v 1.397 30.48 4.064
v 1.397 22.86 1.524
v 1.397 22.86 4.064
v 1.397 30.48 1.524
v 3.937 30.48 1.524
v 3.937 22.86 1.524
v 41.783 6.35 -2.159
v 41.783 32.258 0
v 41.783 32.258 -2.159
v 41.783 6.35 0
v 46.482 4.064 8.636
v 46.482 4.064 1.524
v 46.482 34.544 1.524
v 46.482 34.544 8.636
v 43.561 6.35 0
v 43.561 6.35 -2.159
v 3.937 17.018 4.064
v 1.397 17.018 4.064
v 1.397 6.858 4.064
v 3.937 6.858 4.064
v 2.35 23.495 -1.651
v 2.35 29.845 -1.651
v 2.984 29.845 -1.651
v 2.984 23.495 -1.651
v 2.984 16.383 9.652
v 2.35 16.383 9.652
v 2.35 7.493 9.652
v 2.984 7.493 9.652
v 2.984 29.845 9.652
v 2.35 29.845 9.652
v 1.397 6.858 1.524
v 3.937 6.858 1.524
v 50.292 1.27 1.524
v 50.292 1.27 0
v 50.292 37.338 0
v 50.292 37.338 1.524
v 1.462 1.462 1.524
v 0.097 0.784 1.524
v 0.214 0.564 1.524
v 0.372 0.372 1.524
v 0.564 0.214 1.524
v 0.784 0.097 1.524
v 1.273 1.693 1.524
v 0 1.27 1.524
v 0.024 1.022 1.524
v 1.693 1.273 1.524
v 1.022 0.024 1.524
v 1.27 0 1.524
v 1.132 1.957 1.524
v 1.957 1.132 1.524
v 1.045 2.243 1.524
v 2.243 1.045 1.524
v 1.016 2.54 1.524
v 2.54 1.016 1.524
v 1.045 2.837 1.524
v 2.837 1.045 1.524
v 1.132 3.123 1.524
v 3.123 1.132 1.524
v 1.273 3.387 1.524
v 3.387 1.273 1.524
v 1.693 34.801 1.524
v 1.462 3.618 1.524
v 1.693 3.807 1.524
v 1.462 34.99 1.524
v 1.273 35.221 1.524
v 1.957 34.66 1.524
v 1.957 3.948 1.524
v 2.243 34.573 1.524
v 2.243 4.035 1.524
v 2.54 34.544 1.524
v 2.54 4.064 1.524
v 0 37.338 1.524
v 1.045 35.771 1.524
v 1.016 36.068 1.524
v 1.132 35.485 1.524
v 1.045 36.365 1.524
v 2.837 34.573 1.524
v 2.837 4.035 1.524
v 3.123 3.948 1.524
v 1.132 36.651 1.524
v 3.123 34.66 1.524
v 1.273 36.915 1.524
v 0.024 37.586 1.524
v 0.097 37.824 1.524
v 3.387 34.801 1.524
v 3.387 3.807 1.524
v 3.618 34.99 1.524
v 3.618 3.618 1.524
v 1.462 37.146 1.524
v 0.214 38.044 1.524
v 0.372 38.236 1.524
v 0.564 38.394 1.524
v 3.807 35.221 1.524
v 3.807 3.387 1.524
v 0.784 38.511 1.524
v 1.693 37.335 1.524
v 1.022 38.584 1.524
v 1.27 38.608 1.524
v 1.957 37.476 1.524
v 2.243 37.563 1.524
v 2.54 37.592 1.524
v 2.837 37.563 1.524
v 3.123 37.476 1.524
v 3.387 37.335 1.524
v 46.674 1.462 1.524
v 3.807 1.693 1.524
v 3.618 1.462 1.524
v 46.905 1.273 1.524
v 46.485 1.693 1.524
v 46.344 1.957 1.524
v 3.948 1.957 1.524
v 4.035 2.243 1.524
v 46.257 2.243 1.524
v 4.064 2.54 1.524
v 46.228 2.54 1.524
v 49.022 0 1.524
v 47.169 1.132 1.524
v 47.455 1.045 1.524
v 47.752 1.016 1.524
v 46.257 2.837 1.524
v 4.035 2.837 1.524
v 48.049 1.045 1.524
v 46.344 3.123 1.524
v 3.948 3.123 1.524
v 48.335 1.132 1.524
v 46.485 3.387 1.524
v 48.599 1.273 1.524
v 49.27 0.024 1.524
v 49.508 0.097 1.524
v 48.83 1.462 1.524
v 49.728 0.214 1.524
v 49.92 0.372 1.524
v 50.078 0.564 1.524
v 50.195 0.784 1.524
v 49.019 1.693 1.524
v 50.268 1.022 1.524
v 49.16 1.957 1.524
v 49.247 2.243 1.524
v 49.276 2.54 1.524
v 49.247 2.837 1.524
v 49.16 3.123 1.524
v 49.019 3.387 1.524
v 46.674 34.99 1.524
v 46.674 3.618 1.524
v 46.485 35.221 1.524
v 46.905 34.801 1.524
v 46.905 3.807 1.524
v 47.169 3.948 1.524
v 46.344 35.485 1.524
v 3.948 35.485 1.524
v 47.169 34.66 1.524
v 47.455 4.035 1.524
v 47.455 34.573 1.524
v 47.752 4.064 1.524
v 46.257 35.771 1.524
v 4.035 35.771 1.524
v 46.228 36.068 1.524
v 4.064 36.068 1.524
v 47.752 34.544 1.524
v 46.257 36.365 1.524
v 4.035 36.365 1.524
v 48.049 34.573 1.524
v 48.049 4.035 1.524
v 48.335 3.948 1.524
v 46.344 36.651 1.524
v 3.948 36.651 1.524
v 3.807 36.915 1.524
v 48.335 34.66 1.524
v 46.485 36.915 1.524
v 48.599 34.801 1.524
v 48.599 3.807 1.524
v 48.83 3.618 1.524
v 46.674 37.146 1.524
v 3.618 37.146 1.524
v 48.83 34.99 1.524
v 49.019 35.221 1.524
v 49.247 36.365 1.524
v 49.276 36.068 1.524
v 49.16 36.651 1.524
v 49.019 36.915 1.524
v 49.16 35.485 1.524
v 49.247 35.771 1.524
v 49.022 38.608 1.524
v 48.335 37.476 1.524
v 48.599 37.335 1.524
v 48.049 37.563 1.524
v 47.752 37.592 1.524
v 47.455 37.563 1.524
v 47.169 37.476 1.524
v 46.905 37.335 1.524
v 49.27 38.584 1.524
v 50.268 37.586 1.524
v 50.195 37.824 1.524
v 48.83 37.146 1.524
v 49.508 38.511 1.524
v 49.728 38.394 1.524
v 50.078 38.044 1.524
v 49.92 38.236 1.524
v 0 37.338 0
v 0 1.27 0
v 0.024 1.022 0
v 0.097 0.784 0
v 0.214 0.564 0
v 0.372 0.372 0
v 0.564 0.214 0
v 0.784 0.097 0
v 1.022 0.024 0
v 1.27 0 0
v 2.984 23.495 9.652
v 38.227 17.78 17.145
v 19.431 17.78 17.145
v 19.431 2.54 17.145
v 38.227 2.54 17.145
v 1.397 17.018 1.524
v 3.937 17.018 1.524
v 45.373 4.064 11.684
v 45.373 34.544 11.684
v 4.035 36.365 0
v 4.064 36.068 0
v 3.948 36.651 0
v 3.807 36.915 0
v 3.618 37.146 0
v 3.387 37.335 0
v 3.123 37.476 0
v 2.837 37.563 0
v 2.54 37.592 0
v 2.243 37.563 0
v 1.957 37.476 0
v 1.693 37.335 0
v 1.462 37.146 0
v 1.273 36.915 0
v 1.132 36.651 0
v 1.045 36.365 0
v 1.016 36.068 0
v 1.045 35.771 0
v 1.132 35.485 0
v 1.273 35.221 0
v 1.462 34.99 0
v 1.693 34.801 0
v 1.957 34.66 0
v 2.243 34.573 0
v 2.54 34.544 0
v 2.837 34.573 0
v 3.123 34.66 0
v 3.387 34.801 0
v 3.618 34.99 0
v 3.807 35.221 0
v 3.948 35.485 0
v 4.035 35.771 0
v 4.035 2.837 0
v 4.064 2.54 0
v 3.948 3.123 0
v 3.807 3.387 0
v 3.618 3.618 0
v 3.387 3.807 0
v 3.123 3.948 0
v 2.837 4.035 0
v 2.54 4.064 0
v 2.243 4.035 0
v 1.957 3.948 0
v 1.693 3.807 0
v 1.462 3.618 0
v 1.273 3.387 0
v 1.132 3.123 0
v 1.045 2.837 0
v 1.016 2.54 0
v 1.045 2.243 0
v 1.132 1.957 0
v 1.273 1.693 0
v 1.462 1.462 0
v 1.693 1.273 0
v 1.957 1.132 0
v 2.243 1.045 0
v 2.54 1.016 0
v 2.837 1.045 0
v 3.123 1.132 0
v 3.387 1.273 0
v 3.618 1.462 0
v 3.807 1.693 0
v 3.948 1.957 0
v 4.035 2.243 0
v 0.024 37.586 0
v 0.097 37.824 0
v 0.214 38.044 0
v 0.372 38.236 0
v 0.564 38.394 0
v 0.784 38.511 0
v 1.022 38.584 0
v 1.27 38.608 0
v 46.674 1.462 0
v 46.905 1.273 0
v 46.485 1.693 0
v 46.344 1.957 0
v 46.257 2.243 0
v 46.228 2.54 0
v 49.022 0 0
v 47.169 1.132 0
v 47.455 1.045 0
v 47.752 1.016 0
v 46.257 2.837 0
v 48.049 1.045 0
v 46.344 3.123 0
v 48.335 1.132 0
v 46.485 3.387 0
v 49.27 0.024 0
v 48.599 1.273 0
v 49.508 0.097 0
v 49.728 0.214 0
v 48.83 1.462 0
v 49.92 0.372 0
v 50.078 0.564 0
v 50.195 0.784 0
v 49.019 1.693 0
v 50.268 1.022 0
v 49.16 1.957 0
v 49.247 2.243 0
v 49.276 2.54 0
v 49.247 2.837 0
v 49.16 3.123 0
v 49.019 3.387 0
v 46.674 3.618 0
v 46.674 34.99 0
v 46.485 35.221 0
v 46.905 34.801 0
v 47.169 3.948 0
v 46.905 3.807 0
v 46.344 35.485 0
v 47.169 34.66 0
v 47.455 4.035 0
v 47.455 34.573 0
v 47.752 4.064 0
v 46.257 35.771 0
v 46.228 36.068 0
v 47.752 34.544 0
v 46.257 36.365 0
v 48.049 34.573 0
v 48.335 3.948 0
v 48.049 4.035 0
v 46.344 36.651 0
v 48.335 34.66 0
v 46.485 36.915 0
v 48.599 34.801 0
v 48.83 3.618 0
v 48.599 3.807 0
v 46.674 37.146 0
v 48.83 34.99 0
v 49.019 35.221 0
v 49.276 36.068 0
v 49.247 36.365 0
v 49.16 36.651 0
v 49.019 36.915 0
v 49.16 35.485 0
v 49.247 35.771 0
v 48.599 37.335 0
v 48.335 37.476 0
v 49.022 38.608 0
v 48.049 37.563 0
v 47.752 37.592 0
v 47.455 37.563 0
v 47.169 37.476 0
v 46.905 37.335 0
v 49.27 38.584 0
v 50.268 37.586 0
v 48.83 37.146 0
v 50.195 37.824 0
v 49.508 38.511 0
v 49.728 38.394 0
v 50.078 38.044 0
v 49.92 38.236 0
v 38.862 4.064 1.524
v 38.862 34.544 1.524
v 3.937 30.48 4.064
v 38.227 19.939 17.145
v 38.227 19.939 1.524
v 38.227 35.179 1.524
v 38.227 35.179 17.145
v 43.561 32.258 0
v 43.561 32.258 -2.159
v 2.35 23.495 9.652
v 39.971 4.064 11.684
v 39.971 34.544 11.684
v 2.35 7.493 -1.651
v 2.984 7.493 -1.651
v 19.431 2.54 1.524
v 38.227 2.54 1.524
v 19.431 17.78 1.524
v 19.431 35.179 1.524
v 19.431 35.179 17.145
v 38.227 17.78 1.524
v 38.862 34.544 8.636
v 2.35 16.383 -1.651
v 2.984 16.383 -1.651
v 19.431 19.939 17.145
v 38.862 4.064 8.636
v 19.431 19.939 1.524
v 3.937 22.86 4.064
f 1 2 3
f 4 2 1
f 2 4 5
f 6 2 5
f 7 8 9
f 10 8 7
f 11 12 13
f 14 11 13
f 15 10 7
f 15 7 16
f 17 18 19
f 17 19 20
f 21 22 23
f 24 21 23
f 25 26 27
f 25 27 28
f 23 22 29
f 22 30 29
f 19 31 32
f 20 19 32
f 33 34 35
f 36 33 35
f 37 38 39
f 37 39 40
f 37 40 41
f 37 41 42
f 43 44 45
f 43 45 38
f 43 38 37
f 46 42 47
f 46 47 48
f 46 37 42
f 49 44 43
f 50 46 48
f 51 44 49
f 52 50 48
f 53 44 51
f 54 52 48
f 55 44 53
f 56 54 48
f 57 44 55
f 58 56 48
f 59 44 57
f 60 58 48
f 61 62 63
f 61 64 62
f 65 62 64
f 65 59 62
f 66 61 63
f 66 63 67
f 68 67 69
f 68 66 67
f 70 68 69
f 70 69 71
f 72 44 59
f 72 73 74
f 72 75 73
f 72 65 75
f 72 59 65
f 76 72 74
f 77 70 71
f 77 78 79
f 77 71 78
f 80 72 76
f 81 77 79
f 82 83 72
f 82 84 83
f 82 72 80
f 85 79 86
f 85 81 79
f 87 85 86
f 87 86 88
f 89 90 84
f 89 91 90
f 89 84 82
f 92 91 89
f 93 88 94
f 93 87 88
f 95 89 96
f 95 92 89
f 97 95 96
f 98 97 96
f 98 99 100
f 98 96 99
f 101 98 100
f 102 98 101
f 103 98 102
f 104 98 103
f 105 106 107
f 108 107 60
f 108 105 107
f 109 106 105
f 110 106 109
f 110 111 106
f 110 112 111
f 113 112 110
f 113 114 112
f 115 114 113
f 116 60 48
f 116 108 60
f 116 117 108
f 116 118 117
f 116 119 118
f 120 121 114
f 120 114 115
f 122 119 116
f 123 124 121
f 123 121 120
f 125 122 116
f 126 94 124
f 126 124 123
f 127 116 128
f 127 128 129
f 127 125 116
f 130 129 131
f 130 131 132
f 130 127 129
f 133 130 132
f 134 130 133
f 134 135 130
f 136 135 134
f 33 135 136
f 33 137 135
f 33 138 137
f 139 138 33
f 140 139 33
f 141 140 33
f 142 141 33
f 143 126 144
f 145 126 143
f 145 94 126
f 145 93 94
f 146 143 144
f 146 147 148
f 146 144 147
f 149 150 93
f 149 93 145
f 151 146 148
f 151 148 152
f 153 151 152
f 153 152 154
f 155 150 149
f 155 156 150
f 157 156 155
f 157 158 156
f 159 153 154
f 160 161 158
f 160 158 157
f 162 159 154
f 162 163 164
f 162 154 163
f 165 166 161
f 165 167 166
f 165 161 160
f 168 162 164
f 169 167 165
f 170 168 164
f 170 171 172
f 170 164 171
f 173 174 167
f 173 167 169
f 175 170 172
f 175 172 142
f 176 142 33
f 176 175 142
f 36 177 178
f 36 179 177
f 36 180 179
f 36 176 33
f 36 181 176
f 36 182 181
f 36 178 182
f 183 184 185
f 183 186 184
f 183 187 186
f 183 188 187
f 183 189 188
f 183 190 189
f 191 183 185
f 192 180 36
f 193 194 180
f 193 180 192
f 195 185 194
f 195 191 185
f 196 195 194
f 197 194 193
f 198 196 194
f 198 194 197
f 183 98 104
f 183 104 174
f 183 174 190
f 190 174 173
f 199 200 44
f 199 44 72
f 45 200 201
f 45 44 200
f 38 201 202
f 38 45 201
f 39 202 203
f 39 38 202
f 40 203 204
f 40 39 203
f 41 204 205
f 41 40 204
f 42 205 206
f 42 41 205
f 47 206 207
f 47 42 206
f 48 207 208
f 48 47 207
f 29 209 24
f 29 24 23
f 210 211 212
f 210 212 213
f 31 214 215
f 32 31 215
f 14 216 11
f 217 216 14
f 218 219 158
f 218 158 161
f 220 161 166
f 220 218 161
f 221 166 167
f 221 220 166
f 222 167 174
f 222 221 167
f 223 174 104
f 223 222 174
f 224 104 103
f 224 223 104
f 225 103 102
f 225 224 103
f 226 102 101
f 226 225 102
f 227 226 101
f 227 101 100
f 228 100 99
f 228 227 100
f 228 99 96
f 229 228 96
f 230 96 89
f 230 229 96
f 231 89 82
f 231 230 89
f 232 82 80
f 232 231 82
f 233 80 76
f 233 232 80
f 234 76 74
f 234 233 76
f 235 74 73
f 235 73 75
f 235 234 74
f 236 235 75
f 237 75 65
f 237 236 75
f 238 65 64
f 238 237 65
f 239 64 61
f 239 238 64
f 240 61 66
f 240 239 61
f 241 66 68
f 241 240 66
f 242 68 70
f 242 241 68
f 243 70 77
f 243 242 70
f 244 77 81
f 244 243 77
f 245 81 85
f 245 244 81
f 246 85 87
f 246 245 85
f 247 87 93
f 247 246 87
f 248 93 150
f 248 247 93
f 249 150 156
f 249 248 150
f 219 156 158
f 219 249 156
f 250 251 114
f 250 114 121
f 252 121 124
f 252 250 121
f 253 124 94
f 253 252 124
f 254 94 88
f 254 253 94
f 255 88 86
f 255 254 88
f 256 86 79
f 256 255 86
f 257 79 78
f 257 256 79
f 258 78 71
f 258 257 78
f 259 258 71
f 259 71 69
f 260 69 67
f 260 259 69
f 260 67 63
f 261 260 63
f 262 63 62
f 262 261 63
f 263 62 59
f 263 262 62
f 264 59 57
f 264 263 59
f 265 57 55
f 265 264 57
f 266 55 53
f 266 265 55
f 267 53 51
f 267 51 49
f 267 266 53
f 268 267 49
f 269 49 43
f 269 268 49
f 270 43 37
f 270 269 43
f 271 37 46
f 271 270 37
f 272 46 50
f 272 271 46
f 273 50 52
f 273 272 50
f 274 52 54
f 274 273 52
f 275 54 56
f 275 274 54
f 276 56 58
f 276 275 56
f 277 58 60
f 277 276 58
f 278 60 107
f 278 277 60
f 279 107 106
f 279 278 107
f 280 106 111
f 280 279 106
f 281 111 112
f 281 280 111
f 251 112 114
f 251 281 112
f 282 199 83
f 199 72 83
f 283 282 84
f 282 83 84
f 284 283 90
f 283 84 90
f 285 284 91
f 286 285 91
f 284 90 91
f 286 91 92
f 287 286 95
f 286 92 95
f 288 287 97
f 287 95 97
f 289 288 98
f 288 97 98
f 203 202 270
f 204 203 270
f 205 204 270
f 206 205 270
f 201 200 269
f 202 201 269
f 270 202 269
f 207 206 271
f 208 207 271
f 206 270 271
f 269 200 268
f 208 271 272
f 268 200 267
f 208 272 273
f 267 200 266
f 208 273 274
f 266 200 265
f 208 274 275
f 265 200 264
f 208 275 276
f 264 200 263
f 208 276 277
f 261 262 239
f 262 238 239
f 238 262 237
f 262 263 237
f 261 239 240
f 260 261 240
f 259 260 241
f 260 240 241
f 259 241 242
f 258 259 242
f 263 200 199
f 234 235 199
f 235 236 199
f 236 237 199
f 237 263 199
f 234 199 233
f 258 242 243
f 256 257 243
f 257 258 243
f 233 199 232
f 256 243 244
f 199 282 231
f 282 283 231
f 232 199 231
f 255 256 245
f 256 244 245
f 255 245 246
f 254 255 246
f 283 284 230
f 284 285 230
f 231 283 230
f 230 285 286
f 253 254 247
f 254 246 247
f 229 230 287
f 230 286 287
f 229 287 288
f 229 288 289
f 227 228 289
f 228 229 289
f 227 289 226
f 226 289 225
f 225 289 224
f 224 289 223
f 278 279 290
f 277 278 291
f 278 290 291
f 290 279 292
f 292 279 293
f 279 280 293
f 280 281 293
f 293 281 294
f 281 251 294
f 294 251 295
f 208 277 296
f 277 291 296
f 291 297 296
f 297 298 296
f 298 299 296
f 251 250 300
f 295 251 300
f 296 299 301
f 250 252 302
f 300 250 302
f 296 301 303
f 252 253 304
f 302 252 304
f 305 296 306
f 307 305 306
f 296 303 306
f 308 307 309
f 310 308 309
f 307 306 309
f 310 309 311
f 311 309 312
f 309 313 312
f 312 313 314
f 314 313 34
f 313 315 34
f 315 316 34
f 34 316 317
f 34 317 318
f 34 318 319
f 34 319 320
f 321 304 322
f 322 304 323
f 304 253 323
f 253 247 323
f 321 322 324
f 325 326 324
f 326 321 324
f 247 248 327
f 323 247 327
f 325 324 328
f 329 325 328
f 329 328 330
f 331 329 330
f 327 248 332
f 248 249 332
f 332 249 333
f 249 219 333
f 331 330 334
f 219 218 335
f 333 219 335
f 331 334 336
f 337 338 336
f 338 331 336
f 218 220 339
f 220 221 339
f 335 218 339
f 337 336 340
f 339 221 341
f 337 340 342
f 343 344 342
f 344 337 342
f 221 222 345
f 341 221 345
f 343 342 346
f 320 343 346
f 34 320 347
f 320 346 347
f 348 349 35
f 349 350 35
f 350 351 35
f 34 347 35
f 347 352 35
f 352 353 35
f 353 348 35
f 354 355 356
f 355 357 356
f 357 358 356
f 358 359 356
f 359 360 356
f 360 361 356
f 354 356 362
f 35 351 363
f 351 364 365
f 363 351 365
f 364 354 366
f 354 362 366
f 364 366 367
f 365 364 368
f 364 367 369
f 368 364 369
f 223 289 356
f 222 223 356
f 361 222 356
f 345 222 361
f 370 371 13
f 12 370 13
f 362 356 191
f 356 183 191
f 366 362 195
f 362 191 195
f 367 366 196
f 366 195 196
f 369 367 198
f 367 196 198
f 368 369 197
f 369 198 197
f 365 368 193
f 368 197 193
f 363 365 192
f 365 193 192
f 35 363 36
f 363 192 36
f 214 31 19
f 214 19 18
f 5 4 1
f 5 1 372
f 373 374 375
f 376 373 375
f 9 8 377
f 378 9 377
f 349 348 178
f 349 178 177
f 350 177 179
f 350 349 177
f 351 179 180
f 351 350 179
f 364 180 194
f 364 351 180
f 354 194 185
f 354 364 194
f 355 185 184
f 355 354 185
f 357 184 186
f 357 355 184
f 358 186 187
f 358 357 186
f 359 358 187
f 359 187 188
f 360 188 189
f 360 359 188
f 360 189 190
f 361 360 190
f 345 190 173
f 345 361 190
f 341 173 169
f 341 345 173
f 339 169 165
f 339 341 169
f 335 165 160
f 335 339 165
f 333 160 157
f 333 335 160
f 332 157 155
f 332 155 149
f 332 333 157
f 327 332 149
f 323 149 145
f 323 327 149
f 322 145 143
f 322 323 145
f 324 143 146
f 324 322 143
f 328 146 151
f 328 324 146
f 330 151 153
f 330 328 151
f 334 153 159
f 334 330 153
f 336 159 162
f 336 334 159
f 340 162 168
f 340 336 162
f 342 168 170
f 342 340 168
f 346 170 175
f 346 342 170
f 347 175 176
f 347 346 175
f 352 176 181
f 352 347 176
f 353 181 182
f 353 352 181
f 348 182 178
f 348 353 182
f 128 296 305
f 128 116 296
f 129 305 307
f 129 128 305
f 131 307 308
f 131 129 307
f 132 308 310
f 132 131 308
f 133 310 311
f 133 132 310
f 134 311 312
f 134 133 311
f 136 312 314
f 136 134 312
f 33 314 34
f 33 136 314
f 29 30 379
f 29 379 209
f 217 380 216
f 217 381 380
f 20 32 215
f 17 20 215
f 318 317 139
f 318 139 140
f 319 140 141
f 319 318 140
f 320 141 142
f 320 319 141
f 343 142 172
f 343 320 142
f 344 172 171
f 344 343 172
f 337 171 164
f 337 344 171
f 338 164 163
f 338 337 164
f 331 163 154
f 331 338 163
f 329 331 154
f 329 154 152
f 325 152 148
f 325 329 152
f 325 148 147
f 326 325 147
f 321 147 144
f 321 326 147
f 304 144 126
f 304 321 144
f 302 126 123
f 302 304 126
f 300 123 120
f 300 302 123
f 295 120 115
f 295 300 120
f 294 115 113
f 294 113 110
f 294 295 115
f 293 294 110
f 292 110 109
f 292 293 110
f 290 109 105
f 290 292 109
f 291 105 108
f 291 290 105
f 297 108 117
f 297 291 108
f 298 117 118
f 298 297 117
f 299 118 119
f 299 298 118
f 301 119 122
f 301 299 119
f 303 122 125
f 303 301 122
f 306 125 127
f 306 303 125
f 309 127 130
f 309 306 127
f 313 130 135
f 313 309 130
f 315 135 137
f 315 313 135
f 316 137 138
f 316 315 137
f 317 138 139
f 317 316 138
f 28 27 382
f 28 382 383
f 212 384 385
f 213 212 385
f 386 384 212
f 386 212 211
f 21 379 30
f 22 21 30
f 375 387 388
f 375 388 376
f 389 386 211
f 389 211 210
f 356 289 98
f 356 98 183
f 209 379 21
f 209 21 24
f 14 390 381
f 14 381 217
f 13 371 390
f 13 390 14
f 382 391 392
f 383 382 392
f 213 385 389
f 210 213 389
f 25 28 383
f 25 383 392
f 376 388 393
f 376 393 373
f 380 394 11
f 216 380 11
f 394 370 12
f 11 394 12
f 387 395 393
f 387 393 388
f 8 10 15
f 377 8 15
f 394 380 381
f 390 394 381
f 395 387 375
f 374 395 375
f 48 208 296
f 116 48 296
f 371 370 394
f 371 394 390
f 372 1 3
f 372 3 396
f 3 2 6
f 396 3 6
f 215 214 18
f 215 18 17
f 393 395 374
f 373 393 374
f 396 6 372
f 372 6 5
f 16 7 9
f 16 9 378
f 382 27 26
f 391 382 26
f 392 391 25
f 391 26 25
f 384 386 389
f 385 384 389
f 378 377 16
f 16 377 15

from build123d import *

# Parameters (mm, degrees)
F0_W          = 50.292
F0_H          = 38.608
F0_R          = 1.524
F1_DEPTH      = 1.524
F2_R          = 1.27
F3_W          = 7.62
F3_H          = 30.48
F4_DEPTH      = 10.16
F5_SIZE2      = 1.109381
F5_SIZE       = 3.048
F3_W_2        = 18.796
F3_H_2        = 15.24
F6_DEPTH      = 15.621
F3_W_3        = 2.54
F3_H_3        = 7.62
F3_H_4        = 10.16
F7_DEPTH      = 2.54
F8_W          = 0.635
F8_H          = 6.35
F8_H_2        = 8.89
F9_DEPTH      = 5.588
F9_DEPTH_BACK = 5.715
F10_W         = 1.778
F10_H         = 25.908
F11_DEPTH     = 2.159


with BuildPart() as f1:
    # F0 (on Top) → F1 (new body)
    with BuildSketch(Plane.XY):
        with Locations((25.146, 19.304)):
            Rectangle(F0_W, F0_H)
        with Locations((2.54, 2.54)):
            Circle(F0_R, mode=Mode.SUBTRACT)
        with Locations((47.752, 2.54)):
            Circle(F0_R, mode=Mode.SUBTRACT)
        with Locations((2.54, 36.068)):
            Circle(F0_R, mode=Mode.SUBTRACT)
        with Locations((47.752, 36.068)):
            Circle(F0_R, mode=Mode.SUBTRACT)
    extrude(amount=F1_DEPTH)

    # F2
    f2_edges = [f1.edges().sort_by_distance(p)[0] for p in [
        (50.292, 38.608, 0.762),
        (0, 38.608, 0.762),
        (0, 0, 0.762),
        (50.292, 0, 0.762),
    ]]
    fillet(f2_edges, radius=F2_R)


with BuildPart() as f4:
    # F3 (on face) → F4 (new body)
    with BuildSketch(Plane.XY.offset(1.524)):
        with Locations((42.672, 19.304)):
            Rectangle(F3_W, F3_H)
    extrude(amount=F4_DEPTH)

    # F5
    f5_edges = [f4.edges().sort_by_distance(p)[0] for p in [
        (46.482, 19.304, 11.684),
        (38.862, 19.304, 11.684),
    ]]
    chamfer(f5_edges, length=F5_SIZE, length2=F5_SIZE2)


with BuildPart() as f6:
    # F3 (on face) → F6 (new body)
    with BuildSketch(Plane.XY.offset(1.524)):
        with Locations((28.829, 27.559)):
            Rectangle(F3_W_2, F3_H_2)
        with Locations((28.829, 10.16)):
            Rectangle(F3_W_2, F3_H_2)
    extrude(amount=F6_DEPTH)


with BuildPart() as f7:
    # F3 (on face) → F7 (new body)
    with BuildSketch(Plane.XY.offset(1.524)):
        with Locations((2.667, 26.67)):
            Rectangle(F3_W_3, F3_H_3)
        with Locations((2.667, 11.938)):
            Rectangle(F3_W_3, F3_H_4)
    extrude(amount=F7_DEPTH)


with BuildPart() as f9:
    # F8 (on face) → F9 (new body, two sides)
    with BuildSketch(Plane.XY.offset(4.064)) as f9_sk:
        with Locations((2.667, 26.67)):
            Rectangle(F8_W, F8_H)
        with Locations((2.667, 11.938)):
            Rectangle(F8_W, F8_H_2)
    extrude(amount=F9_DEPTH)
    extrude(f9_sk.sketch, amount=-F9_DEPTH_BACK)


with BuildPart() as f11:
    # F10 (on face) → F11 (new body)
    with BuildSketch(Plane(origin=(0, 0, 0), x_dir=(1, 0, 0), z_dir=(0, 0, -1))):
        with Locations((42.672, -19.304)):
            Rectangle(F10_W, F10_H)
    extrude(amount=F11_DEPTH)


solid = Compound([f1.part, f4.part, f6.part, f7.part, f9.part, f11.part])
